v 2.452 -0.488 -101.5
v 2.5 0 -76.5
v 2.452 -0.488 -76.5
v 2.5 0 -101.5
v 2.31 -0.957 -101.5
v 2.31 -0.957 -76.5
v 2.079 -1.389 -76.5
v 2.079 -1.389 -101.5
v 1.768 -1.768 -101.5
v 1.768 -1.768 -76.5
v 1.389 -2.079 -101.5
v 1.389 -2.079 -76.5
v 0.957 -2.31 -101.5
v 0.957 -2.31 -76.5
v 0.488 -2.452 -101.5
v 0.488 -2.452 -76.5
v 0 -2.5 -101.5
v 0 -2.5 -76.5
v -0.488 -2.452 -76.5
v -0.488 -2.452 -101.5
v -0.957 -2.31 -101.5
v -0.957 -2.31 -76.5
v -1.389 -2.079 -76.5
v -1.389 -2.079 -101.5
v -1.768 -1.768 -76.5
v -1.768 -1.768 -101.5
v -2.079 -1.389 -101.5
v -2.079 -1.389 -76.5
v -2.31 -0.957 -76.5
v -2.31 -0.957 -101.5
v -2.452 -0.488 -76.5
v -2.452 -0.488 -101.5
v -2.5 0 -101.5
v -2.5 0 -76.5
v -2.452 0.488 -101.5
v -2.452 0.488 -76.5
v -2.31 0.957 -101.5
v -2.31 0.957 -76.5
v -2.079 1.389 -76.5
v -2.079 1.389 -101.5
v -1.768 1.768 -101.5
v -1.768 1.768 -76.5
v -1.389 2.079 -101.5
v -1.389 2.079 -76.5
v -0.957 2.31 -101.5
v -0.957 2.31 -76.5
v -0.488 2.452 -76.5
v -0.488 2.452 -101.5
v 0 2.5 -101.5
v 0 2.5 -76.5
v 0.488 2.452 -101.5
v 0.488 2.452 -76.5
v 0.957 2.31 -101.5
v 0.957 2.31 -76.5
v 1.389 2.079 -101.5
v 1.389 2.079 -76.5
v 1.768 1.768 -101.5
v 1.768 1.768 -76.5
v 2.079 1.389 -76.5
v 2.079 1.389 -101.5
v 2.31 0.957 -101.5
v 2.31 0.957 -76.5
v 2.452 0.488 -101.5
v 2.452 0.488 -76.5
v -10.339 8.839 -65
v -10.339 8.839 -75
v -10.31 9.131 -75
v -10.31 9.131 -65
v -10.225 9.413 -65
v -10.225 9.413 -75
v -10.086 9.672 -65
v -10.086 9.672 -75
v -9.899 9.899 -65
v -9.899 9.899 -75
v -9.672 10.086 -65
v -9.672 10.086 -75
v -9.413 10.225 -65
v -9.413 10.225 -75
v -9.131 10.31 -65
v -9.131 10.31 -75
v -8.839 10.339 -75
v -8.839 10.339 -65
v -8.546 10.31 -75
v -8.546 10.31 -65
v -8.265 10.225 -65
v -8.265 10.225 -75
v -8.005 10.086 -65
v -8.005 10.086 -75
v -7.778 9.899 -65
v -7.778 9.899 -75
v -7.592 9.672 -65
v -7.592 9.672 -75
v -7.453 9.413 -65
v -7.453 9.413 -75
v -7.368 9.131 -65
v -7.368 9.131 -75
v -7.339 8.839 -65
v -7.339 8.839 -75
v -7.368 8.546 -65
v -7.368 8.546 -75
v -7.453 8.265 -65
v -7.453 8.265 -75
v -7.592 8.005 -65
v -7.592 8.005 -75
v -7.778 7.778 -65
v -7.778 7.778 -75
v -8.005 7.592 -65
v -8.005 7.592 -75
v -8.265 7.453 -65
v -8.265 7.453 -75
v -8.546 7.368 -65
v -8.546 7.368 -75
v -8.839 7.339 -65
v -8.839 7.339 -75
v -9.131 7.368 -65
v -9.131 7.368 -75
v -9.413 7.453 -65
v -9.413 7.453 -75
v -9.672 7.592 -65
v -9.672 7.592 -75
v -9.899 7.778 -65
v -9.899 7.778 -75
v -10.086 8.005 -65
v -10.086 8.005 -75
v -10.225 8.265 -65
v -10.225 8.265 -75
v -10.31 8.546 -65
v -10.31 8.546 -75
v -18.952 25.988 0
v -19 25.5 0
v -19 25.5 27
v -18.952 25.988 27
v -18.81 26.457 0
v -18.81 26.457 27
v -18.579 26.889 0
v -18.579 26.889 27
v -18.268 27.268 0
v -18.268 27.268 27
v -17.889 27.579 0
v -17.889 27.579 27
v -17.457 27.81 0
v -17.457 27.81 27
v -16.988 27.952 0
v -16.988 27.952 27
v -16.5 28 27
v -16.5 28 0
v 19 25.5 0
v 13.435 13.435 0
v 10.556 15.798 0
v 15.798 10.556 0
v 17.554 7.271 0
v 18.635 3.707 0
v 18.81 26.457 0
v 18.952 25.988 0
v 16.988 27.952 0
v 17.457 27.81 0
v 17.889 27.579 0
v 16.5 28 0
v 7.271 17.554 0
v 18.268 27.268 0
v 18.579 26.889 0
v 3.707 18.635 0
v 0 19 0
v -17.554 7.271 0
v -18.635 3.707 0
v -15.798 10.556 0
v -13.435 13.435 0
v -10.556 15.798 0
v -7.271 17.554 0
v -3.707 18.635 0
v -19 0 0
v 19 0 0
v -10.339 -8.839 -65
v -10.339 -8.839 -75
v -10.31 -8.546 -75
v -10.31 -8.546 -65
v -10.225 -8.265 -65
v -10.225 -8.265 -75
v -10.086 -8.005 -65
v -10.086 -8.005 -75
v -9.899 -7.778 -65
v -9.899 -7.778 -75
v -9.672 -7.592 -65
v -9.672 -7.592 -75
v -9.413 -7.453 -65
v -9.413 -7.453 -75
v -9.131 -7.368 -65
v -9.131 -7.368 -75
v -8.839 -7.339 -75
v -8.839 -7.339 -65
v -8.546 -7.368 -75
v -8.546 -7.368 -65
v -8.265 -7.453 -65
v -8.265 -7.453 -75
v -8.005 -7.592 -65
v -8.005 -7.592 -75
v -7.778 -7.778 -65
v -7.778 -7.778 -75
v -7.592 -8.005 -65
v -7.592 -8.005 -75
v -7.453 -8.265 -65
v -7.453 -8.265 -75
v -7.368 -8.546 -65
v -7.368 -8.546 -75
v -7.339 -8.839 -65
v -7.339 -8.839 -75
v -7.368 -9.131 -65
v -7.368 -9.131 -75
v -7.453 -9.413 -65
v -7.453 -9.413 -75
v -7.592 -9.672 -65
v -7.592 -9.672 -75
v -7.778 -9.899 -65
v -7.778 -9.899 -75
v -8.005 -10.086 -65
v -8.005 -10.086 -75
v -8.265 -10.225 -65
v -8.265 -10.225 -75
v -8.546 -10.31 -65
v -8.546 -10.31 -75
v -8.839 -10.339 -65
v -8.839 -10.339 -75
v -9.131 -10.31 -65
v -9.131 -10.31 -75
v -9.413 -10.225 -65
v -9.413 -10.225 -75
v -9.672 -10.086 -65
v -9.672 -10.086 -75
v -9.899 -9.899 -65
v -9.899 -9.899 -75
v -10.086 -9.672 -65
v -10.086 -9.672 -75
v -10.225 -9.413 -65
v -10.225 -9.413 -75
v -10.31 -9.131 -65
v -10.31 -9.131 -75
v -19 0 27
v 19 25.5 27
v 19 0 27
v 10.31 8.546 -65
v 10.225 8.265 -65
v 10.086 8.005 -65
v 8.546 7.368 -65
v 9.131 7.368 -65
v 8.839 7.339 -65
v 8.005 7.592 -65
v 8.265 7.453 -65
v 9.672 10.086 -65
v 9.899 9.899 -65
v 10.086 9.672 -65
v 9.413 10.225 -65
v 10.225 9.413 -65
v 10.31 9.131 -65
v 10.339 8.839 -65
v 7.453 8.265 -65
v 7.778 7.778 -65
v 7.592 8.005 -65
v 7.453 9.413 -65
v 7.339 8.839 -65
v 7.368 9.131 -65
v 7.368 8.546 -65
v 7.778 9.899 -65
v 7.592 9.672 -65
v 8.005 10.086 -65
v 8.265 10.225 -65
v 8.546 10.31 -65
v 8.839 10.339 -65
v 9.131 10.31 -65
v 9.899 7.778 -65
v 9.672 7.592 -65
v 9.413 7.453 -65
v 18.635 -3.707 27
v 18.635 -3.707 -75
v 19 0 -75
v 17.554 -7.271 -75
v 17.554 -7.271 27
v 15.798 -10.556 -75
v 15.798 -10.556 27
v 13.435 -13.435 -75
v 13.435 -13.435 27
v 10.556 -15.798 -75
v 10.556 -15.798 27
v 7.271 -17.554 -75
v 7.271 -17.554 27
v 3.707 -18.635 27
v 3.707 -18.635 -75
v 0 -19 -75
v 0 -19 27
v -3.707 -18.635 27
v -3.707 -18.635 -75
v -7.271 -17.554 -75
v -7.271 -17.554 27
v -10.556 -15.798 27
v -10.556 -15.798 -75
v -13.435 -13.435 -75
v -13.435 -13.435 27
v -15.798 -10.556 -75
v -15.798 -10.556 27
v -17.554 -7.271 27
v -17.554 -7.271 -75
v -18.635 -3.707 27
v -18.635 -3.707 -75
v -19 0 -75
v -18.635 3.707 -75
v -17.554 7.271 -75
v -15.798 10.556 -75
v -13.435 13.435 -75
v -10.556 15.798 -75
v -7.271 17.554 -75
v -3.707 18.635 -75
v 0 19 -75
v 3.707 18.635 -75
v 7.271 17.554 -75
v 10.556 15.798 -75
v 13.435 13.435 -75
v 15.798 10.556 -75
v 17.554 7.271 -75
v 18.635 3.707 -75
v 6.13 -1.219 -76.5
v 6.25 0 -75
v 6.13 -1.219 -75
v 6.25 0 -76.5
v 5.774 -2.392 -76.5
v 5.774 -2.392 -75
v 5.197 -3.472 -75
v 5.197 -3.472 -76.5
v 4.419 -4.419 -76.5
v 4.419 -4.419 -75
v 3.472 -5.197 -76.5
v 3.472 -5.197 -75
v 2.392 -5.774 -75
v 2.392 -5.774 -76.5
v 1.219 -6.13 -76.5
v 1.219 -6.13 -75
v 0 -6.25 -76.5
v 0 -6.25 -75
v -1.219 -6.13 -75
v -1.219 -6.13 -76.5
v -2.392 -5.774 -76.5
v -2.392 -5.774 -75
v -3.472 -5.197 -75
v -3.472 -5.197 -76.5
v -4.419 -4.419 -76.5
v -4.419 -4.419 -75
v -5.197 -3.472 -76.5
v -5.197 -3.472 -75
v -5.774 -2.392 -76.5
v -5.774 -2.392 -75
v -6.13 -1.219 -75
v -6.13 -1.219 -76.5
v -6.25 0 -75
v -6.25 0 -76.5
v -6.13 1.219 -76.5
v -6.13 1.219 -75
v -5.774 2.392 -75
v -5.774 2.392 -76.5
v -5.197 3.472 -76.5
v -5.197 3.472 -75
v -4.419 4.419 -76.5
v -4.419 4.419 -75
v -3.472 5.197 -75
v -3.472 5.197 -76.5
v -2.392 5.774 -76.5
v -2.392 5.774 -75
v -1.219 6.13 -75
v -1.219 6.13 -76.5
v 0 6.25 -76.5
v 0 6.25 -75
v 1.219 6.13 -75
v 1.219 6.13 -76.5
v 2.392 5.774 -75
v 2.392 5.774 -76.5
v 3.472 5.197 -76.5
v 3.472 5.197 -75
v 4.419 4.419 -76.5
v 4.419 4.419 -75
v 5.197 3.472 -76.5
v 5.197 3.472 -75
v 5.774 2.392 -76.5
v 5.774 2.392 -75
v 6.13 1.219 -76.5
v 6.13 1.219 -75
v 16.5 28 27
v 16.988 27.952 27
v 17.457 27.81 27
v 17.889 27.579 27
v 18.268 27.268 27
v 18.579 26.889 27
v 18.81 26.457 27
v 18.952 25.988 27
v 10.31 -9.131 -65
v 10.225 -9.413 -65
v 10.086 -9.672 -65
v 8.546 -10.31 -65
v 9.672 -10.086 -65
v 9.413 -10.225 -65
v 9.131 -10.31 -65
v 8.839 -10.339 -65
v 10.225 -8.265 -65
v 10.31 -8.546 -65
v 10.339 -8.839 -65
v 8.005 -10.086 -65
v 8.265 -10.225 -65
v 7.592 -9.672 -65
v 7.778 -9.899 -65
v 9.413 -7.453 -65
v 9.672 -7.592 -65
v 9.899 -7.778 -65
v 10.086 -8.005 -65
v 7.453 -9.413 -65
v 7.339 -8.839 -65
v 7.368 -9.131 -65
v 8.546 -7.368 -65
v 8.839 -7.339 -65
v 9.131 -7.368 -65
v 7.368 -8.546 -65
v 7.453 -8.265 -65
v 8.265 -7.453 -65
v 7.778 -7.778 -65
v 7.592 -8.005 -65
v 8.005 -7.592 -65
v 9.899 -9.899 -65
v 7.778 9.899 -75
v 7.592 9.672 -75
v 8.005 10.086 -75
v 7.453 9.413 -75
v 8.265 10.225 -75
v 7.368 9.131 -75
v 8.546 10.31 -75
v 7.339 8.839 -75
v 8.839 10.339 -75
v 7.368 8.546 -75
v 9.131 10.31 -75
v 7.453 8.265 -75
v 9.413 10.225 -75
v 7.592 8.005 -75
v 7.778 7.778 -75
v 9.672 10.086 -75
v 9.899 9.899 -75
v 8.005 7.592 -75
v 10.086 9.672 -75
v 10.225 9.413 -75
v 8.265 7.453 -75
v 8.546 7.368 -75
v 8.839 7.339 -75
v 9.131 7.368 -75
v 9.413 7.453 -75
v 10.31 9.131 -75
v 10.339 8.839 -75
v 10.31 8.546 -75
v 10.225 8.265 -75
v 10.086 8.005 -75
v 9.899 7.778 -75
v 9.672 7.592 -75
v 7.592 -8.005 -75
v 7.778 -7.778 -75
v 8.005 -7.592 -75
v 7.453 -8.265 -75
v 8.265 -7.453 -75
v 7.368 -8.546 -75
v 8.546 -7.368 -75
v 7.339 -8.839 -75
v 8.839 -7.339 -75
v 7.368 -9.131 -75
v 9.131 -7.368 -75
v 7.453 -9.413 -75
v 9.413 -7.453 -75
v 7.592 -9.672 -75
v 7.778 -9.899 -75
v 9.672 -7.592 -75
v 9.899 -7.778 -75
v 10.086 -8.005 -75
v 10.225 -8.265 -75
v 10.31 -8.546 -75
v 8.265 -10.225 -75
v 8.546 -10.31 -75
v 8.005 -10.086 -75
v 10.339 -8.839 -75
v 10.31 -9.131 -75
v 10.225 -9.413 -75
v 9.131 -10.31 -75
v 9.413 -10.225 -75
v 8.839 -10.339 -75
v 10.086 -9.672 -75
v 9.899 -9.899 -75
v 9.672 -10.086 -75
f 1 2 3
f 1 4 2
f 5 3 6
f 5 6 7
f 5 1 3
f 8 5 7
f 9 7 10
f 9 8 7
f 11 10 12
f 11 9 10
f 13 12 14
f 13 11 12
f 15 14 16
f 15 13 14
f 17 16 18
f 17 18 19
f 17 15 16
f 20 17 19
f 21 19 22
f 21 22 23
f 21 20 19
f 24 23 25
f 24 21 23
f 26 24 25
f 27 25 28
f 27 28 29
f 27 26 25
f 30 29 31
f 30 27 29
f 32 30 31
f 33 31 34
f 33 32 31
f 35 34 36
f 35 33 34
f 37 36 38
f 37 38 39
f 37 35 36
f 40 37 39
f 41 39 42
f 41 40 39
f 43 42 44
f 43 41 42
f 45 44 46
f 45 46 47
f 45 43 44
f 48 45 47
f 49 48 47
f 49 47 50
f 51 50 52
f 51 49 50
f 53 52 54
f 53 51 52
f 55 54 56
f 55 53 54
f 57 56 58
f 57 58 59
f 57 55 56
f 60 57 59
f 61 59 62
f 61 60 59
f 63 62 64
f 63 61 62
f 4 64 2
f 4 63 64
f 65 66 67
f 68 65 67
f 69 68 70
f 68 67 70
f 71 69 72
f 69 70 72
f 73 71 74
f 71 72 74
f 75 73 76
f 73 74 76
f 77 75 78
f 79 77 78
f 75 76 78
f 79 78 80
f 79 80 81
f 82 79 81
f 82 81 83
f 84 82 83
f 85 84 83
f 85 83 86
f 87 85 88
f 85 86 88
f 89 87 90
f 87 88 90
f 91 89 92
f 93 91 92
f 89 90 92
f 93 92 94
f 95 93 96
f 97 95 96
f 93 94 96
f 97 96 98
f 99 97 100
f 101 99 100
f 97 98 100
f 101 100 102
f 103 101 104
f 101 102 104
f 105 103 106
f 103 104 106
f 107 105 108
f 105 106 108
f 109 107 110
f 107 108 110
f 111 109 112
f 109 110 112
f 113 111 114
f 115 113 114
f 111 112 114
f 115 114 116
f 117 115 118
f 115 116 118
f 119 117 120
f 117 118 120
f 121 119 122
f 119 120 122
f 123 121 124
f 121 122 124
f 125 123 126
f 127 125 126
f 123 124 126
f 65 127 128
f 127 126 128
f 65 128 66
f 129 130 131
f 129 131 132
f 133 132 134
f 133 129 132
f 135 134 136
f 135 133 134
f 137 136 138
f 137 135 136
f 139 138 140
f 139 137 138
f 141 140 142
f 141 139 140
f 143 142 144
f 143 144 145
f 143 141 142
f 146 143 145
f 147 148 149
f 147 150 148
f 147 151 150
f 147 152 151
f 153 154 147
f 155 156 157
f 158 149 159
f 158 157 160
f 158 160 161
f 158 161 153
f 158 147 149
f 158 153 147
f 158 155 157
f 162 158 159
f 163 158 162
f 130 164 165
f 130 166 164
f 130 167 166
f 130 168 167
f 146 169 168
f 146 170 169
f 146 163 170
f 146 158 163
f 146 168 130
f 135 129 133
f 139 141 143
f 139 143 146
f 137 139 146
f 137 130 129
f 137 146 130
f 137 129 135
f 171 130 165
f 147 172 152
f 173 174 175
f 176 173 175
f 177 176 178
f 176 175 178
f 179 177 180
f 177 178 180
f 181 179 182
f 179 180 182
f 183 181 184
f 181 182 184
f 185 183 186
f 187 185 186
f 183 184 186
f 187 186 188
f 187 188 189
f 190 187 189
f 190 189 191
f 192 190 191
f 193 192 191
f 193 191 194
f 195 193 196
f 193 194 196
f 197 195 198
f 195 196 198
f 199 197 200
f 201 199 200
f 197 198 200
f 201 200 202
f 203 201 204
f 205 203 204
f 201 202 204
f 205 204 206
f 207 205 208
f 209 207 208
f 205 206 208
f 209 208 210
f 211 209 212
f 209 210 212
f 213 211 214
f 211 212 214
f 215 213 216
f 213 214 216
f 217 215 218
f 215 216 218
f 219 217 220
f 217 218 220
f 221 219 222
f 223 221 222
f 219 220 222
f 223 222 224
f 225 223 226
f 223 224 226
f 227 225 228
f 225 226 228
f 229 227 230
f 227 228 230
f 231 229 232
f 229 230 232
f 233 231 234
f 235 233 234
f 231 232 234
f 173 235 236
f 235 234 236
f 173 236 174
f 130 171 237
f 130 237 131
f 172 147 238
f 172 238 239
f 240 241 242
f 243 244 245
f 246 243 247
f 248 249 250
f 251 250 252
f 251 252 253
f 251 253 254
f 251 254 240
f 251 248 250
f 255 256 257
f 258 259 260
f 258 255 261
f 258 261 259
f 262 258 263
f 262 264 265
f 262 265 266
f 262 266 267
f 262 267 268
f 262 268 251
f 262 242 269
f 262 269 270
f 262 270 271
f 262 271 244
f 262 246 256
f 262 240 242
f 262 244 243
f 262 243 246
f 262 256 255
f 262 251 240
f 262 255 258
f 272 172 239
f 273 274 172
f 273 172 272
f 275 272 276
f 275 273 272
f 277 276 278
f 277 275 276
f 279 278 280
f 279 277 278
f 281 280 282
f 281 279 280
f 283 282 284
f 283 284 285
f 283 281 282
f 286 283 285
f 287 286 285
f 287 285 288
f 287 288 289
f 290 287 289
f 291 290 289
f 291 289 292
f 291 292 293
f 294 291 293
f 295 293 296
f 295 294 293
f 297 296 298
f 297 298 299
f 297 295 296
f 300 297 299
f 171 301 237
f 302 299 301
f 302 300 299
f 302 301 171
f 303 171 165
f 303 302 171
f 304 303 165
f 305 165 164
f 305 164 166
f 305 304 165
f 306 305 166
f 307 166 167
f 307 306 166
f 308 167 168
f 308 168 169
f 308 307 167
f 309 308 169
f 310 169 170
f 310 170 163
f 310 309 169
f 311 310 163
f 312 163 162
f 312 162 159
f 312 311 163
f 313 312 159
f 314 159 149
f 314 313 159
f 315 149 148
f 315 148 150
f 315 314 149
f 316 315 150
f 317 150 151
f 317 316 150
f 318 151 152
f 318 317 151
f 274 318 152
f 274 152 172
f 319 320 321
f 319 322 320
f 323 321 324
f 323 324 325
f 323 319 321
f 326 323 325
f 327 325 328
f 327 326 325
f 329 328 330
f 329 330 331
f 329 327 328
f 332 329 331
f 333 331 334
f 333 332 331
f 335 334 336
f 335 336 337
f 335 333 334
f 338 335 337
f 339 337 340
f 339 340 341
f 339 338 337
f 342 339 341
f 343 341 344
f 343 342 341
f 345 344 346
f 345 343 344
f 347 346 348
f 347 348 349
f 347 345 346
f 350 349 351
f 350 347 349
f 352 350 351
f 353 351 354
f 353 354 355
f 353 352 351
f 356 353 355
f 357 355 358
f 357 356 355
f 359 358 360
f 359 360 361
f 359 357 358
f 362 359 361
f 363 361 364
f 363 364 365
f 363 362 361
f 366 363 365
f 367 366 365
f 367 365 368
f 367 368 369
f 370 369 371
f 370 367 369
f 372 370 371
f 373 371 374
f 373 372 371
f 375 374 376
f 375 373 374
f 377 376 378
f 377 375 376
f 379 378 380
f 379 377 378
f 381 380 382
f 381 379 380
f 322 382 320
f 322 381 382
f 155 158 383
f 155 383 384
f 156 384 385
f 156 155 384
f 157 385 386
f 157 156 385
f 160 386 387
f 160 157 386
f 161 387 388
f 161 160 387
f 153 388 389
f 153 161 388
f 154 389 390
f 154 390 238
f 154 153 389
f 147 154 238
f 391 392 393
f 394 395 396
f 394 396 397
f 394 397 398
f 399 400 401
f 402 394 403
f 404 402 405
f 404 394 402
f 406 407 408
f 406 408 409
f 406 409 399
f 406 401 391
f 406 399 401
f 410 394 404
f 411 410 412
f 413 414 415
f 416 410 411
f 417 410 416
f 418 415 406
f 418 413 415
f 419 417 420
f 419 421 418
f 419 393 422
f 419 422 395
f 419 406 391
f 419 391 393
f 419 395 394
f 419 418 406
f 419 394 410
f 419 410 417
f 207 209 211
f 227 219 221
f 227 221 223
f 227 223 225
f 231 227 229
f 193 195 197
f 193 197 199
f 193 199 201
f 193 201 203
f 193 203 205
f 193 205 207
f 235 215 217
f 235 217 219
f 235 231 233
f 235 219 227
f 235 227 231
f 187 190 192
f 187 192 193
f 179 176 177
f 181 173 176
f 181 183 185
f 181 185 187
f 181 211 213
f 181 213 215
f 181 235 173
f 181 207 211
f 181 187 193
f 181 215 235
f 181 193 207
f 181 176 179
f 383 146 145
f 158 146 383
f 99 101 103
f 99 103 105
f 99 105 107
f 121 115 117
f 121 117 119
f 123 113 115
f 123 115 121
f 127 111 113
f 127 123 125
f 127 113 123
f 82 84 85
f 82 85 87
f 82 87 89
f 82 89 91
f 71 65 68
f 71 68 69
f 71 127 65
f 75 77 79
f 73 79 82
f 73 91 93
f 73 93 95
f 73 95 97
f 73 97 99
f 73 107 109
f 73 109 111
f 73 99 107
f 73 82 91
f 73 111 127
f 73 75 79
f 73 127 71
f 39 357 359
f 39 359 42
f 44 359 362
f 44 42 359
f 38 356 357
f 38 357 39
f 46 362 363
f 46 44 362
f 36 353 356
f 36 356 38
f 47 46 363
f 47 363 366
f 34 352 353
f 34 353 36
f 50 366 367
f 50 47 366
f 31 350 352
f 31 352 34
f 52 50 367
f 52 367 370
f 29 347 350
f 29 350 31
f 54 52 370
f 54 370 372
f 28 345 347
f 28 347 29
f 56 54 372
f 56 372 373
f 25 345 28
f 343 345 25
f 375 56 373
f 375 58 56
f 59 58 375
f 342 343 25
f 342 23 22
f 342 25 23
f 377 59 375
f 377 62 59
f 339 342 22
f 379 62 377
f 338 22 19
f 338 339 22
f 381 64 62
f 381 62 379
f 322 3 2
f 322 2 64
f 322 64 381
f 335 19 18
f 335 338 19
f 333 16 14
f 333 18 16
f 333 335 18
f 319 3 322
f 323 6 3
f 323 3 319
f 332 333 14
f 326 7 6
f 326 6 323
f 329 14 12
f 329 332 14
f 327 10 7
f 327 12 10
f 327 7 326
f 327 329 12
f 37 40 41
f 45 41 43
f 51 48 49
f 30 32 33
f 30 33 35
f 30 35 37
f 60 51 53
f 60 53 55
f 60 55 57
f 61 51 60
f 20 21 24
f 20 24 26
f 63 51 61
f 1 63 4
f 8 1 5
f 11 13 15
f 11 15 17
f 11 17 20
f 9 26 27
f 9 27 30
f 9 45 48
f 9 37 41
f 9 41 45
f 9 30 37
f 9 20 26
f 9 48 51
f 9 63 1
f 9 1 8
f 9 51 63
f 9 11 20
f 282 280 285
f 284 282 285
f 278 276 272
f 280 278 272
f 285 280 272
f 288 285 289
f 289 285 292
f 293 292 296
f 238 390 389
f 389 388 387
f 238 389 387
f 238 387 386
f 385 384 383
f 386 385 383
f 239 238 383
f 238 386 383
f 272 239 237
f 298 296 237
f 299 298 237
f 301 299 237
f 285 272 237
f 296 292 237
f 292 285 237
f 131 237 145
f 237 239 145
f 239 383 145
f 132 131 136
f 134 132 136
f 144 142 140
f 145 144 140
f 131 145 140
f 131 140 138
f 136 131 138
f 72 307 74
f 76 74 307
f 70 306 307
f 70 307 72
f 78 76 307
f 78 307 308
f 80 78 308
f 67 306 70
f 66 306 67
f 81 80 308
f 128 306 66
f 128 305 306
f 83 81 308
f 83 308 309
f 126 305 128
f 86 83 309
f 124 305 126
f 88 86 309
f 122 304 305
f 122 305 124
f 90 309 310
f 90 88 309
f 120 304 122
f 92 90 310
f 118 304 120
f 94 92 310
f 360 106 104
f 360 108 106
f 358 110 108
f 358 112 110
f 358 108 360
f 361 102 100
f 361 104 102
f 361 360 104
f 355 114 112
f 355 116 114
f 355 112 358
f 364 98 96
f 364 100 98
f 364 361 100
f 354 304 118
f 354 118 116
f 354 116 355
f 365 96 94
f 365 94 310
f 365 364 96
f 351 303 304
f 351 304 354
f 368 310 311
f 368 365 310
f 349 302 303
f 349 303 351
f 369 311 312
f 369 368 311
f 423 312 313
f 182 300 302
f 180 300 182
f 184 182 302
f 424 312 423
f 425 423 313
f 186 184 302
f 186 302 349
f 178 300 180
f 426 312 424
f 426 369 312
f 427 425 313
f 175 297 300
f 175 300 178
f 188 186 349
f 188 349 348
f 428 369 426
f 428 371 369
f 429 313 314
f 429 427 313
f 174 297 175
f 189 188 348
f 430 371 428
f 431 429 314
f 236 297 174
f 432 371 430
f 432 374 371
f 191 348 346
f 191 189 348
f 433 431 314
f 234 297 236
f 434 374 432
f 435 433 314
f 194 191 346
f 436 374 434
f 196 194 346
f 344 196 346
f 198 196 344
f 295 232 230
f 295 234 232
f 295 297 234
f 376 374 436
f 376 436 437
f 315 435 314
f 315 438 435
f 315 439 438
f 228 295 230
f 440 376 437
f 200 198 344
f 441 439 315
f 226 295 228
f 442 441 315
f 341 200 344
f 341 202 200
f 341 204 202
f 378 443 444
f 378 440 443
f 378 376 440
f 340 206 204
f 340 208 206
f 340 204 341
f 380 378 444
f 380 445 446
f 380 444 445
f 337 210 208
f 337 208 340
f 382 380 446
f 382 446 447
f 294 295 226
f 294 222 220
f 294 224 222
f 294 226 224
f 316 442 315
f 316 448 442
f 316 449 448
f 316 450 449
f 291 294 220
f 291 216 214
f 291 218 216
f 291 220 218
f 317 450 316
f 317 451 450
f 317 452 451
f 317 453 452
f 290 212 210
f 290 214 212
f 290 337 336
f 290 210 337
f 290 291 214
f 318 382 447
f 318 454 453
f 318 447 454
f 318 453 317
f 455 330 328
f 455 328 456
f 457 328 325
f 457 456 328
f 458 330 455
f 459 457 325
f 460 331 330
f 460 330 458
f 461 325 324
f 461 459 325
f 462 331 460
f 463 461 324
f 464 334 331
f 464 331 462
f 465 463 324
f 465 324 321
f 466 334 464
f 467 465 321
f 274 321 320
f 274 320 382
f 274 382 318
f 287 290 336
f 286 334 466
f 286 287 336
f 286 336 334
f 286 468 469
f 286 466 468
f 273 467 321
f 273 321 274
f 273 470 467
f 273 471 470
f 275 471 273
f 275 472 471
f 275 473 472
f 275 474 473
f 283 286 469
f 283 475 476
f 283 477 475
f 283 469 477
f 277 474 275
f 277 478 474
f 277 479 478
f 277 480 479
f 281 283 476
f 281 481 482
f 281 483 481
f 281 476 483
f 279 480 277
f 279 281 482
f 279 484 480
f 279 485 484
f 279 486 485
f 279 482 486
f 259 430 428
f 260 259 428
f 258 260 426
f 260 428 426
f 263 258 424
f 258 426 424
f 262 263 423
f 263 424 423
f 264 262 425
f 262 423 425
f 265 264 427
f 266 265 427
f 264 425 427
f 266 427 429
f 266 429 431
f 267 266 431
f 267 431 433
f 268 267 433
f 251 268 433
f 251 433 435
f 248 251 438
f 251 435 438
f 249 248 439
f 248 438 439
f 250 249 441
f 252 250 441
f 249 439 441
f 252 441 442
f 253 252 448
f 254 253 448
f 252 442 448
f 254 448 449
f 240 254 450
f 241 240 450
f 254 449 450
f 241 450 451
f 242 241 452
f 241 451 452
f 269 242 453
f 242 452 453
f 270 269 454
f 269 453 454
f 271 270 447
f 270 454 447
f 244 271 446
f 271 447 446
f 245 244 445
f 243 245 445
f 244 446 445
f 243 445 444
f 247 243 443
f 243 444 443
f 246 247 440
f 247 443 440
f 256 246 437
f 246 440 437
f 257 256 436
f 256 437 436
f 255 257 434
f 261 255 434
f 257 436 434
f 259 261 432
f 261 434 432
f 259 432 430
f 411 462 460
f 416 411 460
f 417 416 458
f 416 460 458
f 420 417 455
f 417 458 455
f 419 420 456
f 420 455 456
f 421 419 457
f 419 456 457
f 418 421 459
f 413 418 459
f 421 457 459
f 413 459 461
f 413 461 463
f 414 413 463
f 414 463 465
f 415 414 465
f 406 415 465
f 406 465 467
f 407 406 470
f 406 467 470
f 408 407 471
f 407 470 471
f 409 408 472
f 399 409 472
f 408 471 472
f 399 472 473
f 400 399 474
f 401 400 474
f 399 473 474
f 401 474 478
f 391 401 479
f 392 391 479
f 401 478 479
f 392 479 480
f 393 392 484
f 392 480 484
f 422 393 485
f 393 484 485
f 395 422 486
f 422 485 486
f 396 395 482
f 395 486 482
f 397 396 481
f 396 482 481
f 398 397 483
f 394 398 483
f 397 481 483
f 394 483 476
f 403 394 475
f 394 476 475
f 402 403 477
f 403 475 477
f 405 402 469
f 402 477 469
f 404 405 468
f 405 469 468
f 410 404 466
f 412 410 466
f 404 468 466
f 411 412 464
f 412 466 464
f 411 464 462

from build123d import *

# Parameters (mm, degrees)
BOSS_EXTRUDE1_DEPTH = 27
SKETCH4_R           = 1.5
CUT_EXTRUDE1_DEPTH  = 10


with BuildPart() as part:
    # Sketch1 → Revolve1 (revolve)
    with BuildSketch(Plane(origin=(0, 0, 0), x_dir=(0, 0, -1), z_dir=(1, 0, 0)), mode=Mode.PRIVATE) as revolve1_sk:
        Polygon((0, 0), (0, 19), (75, 19), (75, 6.25), (76.5, 6.25), (76.5, 2.5), (101.5, 2.5), (101.5, 0), align=None)
    revolve(revolve1_sk.sketch.rotate(Axis((0, 0, 0), (0, 0, -1)), 90), axis=Axis((0, 0, 0), (0, 0, -1)))

    # Sketch2 → Boss-Extrude1 (add)
    with BuildSketch(Plane.XY):
        with BuildLine():
            Line((-19, 0), (-19, 25.5))
            ThreePointArc((-19, 25.5), (-18.267766953, 27.267766953), (-16.5, 28))
            Line((-16.5, 28), (16.5, 28))
            ThreePointArc((16.5, 28), (18.267766953, 27.267766953), (19, 25.5))
            Line((19, 25.5), (19, 0))
            ThreePointArc((19, 0), (0, -19), (-19, 0))
        make_face()
    extrude(amount=BOSS_EXTRUDE1_DEPTH)

    # Sketch4 → Cut-Extrude1 (cut)
    with BuildSketch(Plane(origin=(0, 0, -75), x_dir=(-1, 0, 0), z_dir=(0, 0, -1))):
        with Locations((-8.838834765, 8.838834765)):
            Circle(SKETCH4_R)
        with Locations((8.838834765, 8.838834765)):
            Circle(SKETCH4_R)
        with Locations((8.838834765, -8.838834765)):
            Circle(SKETCH4_R)
        with Locations((-8.838834765, -8.838834765)):
            Circle(SKETCH4_R)
    extrude(amount=-CUT_EXTRUDE1_DEPTH, mode=Mode.SUBTRACT)


solid = part.part
